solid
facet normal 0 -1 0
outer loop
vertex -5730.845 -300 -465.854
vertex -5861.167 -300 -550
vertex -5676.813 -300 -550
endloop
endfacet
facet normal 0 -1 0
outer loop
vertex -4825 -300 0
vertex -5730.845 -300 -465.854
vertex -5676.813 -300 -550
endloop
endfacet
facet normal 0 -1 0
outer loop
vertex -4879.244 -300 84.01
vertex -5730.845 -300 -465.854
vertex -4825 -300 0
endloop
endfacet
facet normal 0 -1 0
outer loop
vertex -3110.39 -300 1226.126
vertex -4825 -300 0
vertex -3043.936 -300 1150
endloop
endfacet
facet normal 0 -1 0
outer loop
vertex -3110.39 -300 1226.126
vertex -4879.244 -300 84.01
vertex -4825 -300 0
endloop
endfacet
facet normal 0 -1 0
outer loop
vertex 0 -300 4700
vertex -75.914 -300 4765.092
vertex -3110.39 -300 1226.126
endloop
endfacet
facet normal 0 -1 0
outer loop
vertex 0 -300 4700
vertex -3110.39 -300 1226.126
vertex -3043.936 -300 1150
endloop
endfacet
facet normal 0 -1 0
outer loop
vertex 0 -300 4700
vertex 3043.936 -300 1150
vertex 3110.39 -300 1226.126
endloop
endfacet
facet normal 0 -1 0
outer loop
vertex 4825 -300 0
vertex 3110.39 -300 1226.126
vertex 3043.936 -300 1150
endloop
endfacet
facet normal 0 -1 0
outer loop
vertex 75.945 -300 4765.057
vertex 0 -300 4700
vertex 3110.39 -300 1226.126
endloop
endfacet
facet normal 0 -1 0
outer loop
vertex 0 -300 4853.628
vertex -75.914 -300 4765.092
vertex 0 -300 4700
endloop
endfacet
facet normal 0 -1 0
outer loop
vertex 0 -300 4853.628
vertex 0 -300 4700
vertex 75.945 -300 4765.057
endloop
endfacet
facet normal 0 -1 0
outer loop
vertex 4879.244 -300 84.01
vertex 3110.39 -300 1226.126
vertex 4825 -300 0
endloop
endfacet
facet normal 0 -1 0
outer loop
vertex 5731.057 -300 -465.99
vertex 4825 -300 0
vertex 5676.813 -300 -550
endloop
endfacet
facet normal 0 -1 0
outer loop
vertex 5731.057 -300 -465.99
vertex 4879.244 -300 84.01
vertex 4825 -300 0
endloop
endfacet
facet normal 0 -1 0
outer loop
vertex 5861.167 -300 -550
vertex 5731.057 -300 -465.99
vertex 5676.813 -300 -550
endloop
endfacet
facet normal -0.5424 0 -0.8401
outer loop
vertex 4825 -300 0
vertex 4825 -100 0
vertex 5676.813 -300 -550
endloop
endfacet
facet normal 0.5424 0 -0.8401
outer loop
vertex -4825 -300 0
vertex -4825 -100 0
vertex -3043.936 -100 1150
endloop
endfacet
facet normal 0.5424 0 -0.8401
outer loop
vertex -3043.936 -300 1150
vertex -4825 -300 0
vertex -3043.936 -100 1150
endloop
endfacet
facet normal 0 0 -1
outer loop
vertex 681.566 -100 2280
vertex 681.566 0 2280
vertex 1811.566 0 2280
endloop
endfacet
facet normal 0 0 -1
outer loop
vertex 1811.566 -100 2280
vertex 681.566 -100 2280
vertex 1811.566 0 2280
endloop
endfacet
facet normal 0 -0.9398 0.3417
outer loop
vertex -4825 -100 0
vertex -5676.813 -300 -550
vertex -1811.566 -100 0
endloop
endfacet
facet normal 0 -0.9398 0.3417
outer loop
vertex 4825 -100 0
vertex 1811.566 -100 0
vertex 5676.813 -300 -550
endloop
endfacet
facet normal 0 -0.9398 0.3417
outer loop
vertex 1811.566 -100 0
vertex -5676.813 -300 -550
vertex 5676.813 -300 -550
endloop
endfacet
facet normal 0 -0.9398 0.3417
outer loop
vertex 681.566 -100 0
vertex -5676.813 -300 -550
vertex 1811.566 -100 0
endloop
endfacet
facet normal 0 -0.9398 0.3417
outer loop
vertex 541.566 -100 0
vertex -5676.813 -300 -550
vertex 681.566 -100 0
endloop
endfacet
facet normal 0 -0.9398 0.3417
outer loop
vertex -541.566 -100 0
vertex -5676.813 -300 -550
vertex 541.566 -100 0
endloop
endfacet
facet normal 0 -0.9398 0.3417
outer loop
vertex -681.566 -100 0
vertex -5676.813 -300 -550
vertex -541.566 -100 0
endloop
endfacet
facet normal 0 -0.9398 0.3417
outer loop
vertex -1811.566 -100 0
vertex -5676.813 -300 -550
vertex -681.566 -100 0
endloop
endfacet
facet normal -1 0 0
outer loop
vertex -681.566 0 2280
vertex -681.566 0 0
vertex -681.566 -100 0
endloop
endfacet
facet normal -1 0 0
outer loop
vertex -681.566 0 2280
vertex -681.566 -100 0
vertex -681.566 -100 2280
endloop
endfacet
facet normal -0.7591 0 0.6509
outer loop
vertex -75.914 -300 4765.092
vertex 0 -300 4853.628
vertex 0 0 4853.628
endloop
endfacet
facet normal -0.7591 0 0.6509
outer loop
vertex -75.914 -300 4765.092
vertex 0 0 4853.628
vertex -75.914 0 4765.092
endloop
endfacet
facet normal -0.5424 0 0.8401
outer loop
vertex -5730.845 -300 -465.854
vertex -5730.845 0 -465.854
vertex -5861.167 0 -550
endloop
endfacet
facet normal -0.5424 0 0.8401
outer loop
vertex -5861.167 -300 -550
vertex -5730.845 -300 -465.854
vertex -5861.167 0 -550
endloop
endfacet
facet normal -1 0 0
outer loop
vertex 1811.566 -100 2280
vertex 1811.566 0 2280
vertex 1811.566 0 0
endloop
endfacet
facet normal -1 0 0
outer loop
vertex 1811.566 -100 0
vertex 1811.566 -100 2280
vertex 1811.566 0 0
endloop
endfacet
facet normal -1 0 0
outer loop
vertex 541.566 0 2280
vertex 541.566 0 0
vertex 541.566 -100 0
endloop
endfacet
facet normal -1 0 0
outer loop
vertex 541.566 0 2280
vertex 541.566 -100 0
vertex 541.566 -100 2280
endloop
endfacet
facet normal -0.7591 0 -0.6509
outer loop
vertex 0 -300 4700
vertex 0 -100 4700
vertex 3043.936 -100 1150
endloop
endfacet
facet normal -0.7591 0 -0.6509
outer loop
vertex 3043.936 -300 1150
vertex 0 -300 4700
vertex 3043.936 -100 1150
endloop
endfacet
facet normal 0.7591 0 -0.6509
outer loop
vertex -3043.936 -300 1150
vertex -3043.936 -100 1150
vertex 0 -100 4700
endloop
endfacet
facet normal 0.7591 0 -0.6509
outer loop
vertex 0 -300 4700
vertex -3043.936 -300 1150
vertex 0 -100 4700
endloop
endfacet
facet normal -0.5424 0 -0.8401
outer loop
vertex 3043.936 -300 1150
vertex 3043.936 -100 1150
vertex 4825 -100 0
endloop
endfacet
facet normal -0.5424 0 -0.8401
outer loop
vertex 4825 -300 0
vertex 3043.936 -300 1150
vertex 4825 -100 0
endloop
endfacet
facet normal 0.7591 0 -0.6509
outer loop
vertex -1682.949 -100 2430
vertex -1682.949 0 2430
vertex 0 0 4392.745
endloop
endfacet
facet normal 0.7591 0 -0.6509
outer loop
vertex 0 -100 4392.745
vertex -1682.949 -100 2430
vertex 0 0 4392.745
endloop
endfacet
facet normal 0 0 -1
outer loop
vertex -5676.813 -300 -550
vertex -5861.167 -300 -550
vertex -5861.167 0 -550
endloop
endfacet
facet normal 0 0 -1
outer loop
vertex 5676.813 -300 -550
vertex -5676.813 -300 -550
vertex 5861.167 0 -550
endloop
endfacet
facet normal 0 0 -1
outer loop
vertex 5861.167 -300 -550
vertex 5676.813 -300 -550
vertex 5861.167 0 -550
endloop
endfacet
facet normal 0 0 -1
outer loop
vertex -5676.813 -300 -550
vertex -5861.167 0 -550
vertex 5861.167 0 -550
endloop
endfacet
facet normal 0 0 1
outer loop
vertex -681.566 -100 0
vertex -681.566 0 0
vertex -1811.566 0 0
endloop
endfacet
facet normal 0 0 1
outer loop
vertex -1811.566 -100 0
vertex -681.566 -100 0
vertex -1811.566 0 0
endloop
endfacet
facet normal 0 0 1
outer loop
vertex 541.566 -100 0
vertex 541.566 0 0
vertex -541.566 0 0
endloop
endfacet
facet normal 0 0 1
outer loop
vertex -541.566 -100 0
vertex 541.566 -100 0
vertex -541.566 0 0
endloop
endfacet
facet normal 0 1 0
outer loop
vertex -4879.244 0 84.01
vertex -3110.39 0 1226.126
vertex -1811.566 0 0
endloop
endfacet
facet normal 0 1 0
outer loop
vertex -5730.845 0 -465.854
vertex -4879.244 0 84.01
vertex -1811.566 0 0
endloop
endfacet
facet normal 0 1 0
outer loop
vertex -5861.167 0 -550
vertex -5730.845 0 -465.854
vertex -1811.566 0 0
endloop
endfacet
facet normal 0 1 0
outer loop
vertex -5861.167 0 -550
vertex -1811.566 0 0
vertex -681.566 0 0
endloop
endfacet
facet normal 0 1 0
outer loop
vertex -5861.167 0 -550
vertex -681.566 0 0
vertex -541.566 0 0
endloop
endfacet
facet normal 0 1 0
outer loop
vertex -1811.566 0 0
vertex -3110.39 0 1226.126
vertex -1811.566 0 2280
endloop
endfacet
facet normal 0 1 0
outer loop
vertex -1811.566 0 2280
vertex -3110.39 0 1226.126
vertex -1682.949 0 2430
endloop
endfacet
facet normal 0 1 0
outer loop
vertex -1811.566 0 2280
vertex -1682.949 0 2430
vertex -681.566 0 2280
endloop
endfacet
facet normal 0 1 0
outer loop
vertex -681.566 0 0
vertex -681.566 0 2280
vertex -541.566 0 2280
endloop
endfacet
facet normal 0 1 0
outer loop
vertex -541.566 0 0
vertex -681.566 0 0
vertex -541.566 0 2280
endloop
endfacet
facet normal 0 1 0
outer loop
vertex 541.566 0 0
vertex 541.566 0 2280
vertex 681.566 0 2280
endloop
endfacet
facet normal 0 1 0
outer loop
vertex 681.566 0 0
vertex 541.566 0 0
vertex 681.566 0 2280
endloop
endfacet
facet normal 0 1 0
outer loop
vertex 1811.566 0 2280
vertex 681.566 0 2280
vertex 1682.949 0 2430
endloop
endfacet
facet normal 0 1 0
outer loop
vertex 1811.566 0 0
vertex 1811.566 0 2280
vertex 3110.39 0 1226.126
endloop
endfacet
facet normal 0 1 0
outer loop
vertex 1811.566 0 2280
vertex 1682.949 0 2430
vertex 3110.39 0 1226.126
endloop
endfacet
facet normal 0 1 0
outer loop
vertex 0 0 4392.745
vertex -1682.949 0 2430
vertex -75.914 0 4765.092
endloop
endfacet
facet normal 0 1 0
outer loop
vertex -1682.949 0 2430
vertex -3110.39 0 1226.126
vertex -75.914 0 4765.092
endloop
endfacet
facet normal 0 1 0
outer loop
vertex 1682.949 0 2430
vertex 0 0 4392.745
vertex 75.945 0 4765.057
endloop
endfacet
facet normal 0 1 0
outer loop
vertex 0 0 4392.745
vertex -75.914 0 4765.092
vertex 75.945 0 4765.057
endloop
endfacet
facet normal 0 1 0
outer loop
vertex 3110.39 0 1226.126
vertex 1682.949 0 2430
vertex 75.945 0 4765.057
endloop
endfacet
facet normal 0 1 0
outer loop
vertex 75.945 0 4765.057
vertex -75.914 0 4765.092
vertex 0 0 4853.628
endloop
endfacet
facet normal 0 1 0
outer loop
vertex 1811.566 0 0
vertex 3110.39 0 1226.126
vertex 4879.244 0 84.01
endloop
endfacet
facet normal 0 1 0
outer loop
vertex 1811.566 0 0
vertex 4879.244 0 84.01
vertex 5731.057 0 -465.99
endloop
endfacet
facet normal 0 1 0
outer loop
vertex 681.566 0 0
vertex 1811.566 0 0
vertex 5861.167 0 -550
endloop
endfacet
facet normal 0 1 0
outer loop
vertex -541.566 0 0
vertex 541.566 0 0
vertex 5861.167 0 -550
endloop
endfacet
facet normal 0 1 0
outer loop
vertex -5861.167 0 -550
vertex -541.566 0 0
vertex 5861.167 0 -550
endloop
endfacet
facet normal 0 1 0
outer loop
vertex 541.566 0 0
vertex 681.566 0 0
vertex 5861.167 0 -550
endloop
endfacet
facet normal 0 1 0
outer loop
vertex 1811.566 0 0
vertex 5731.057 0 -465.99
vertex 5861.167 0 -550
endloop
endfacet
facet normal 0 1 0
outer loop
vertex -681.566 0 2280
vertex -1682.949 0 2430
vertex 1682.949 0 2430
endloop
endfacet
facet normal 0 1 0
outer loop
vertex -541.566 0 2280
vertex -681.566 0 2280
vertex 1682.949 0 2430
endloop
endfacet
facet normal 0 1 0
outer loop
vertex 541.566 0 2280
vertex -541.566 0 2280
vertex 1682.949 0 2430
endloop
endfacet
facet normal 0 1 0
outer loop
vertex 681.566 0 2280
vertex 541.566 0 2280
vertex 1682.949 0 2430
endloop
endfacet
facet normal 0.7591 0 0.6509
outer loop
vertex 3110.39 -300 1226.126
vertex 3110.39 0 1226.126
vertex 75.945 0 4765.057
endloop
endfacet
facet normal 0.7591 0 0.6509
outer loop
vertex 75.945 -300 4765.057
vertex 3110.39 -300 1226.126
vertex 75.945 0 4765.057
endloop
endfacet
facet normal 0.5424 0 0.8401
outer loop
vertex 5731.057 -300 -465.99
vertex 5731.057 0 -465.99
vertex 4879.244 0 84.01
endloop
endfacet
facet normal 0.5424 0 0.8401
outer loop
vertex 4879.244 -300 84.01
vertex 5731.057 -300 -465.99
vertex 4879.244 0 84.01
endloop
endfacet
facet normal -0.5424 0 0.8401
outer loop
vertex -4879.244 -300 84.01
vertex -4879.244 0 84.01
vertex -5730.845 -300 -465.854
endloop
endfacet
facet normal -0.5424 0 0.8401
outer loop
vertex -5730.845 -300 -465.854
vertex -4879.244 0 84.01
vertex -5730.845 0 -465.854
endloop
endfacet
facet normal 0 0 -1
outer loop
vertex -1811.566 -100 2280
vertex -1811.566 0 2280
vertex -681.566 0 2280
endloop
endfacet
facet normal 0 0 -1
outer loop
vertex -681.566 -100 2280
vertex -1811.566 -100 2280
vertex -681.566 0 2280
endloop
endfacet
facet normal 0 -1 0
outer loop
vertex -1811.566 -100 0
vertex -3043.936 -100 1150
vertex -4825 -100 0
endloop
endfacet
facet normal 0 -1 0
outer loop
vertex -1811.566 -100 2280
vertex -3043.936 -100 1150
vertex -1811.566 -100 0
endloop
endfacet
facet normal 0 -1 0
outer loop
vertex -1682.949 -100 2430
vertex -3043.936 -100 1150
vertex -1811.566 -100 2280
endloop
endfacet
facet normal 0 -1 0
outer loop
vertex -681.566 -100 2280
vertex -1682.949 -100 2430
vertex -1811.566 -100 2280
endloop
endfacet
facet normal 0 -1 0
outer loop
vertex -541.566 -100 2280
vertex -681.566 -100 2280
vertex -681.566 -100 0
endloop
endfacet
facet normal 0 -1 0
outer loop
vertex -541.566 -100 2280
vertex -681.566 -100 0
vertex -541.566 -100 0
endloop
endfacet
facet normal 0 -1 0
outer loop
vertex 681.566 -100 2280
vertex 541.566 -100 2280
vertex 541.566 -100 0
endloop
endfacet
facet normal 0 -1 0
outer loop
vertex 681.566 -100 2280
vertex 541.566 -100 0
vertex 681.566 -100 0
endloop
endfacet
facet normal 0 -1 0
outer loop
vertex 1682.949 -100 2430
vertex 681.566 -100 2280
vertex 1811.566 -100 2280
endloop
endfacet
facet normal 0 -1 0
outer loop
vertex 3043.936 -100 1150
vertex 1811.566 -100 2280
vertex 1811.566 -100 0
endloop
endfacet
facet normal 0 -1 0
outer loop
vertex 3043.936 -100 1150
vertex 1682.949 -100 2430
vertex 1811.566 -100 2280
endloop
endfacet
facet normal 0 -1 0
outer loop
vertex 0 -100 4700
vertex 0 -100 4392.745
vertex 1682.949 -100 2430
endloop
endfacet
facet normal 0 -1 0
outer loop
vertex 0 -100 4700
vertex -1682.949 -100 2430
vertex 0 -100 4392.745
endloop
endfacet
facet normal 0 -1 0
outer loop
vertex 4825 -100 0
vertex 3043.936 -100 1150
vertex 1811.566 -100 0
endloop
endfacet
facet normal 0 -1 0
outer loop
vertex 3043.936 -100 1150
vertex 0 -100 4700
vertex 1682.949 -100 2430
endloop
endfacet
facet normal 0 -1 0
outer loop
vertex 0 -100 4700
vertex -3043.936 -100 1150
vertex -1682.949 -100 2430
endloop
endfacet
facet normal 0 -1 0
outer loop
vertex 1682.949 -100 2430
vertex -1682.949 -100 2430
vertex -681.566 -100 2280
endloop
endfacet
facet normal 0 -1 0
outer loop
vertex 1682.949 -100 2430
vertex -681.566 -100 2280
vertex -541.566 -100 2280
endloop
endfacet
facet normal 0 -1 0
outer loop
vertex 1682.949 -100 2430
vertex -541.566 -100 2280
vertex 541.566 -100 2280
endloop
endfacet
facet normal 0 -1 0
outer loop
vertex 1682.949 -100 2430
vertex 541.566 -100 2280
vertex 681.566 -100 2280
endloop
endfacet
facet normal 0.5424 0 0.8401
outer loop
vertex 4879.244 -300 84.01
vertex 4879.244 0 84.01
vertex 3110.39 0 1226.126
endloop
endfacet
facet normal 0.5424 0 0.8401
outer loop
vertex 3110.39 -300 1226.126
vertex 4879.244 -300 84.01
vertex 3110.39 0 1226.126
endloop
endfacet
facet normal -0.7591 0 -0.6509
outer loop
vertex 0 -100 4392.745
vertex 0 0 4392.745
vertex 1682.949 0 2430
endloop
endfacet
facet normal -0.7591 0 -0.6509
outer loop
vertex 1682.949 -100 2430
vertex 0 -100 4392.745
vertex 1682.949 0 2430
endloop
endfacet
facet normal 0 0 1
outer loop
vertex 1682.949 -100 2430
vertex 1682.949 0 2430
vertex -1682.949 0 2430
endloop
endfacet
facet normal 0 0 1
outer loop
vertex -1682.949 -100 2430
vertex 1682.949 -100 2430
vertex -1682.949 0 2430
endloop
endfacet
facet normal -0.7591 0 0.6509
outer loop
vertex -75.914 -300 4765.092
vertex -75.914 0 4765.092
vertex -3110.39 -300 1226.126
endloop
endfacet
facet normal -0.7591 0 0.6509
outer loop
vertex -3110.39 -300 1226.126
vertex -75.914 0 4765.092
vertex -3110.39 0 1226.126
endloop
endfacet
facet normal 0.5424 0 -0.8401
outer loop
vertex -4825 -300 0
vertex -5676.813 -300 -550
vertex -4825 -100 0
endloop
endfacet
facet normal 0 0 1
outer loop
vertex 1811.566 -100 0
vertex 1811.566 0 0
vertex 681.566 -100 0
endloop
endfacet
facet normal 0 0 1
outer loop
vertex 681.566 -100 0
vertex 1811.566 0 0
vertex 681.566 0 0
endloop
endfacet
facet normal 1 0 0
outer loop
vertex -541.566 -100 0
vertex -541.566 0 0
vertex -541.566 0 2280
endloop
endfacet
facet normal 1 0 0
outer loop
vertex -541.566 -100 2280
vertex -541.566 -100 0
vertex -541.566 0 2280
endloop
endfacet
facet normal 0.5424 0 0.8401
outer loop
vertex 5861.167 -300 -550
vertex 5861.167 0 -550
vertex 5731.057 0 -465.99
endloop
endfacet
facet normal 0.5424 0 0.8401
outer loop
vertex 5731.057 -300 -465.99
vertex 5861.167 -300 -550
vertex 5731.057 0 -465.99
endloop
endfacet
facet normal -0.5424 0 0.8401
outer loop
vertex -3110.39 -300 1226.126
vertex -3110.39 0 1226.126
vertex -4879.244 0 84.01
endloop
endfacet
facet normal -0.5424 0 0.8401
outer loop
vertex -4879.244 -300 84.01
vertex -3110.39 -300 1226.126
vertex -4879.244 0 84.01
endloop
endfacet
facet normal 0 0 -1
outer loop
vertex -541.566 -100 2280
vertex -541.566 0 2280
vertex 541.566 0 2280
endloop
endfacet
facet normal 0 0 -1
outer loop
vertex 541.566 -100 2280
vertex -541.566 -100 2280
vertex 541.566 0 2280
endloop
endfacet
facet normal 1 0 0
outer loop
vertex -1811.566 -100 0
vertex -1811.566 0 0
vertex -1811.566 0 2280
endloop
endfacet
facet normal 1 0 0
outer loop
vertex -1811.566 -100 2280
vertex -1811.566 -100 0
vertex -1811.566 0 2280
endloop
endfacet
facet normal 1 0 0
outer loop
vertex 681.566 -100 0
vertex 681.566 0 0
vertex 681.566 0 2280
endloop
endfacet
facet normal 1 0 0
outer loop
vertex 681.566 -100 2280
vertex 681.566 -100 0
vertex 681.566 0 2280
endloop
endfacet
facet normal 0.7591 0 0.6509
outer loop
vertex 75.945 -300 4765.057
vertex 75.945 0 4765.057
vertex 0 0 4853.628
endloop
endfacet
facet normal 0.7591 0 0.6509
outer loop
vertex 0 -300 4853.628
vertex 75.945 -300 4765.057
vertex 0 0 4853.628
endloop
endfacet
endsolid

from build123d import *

# Parameters (mm, degrees)
F0_W     = 140
F0_H     = 2280
F1_DEPTH = 100
F2_DEPTH = 300
F4_DEPTH = 6500
F6_DEPTH = 300


with BuildPart() as f1:
    # F0 (on Front) → F1 (new body)
    with BuildSketch(Plane.XZ):
        Polygon((-4825, 0), (-4030, 0), (-1811.566155, 0), (-1811.566155, 2280), (-681.566155, 2280), (-541.566155, 2280), (541.566155, 2280), (681.566155, 2280), (1811.566155, 2280), (1811.566155, 0), (4030, 0), (4825, 0), (3043.93617, 1150), (0, 4700), (-3043.93617, 1150), align=None)
        Polygon((1682.949134, 2430), (-1682.949134, 2430), (0, 4392.744647), align=None, mode=Mode.SUBTRACT)
        with Locations((-611.566155, 1140)):
            Rectangle(F0_W, F0_H)
        with Locations((611.566155, 1140)):
            Rectangle(F0_W, F0_H)
    extrude(amount=F1_DEPTH)

    # F0 (on Front) → F2 (join)
    with BuildSketch(Plane.XZ):
        Polygon((-1811.566155, 0), (-4030, 0), (-4825, 0), (-5676.813136, -550), (5676.813136, -550), (4825, 0), (4030, 0), (1811.566155, 0), (681.566155, 0), (541.566155, 0), (-541.566155, 0), (-681.566155, 0), align=None)
    extrude(amount=F2_DEPTH)

    # F3 (on Right) → F4 (cut, symmetric)
    with BuildSketch(Plane.YZ):
        Polygon((-100, 0), (-300, 0), (-300, -550), align=None)
    extrude(amount=F4_DEPTH, both=True, mode=Mode.SUBTRACT)

    # F5 (on Front) → F6 (join)
    with BuildSketch(Plane.XZ):
        Polygon((-3043.93617, 1150), (0, 4700), (3043.93617, 1150), (4825, 0), (5676.813136, -550), (5861.166876, -550), (5731.056679, -465.99025), (4879.243543, 84.00975), (3110.389804, 1226.125919), (75.944979, 4765.056609), (0, 4853.627676), (-75.914258, 4765.092438), (-3110.389804, 1226.125919), (-4879.243543, 84.00975), (-5730.845054, -465.853608), (-5861.166876, -550), (-5676.813136, -550), (-4825, 0), align=None)
    extrude(amount=F6_DEPTH)


solid = f1.part
